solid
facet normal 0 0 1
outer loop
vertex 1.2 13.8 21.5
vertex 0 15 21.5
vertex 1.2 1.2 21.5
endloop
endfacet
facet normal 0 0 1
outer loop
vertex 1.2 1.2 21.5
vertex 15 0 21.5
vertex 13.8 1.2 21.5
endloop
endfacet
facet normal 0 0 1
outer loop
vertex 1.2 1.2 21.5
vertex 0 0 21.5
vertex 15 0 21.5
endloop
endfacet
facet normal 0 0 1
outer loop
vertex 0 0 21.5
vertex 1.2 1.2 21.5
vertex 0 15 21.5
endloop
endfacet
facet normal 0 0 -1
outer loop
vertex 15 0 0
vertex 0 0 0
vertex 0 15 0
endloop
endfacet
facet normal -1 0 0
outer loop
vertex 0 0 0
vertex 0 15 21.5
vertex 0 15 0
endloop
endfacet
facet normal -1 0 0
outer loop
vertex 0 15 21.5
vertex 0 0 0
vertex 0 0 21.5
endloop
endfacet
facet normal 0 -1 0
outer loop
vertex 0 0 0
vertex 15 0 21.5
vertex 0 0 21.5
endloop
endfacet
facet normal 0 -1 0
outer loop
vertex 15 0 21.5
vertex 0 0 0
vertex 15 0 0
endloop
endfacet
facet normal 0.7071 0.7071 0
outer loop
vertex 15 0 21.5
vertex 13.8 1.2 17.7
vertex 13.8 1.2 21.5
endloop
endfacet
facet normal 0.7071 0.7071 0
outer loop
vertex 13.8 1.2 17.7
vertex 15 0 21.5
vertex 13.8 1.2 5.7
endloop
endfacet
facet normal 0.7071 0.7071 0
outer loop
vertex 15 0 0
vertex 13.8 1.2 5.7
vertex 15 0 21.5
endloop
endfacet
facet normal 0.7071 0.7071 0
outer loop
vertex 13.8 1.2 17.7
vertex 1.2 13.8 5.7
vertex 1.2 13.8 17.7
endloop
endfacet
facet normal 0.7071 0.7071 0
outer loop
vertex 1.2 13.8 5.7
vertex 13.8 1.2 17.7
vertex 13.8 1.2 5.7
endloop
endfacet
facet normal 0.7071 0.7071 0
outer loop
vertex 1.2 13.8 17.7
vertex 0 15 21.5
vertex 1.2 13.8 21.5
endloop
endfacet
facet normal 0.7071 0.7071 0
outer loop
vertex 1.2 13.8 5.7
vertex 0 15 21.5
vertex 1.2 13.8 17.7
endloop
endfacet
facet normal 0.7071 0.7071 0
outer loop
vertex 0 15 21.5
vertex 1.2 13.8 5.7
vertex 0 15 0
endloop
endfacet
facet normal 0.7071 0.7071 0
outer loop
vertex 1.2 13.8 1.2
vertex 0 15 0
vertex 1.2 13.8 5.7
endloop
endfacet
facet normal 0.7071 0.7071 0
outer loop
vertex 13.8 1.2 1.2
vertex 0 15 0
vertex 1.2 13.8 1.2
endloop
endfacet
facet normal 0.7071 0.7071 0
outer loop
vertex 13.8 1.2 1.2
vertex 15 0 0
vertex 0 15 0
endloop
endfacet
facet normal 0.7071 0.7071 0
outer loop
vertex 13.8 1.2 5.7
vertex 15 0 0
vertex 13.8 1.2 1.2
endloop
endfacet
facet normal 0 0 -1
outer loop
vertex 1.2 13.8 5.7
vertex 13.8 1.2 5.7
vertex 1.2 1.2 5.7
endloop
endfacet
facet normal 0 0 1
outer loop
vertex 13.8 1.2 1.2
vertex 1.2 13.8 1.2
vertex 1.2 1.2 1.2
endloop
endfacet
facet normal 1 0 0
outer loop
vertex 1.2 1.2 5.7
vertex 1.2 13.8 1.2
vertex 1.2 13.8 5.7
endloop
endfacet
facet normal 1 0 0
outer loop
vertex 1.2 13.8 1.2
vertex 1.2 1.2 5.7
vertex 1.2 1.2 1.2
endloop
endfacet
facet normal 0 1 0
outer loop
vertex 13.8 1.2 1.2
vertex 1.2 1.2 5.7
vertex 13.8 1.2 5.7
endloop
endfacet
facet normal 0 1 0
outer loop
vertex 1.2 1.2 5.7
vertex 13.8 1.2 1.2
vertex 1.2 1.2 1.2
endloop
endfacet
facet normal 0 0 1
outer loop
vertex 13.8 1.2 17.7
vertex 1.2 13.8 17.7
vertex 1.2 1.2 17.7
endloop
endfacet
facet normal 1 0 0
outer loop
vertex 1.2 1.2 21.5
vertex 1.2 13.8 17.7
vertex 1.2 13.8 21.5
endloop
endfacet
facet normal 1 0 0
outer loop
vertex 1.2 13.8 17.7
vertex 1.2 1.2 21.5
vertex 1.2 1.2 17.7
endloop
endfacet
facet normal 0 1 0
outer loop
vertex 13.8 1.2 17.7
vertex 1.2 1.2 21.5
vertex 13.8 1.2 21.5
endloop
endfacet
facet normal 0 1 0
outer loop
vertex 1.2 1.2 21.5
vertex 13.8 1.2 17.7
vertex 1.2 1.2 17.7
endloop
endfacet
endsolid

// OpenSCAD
DELTA=0.01;

WIDTH = 15;
LED=12;
GLASS_THICK=4.5;
ACRYLIC_THICK=2.6;

BOTTOM = 1.2;
TOP = 1.2;
WALL = 1.2;

HEIGHT = BOTTOM + GLASS_THICK + LED + ACRYLIC_THICK + TOP;

module mirror()
{
    cube([304,304,GLASS_THICK]);
}

module acrylic()
{
    cube([304,304,ACRYLIC_THICK]);
}

module corner()
{
    difference()
    {
        cube([WIDTH, WIDTH, HEIGHT]);
        translate([WIDTH, 0, -DELTA]) rotate([0,0,45]) cube([WIDTH*sqrt(2), WIDTH*sqrt(2), HEIGHT + DELTA*2]);
    }
}

difference()
{
    corner();
    translate([WALL, WALL, BOTTOM]) mirror();
    translate([WALL, WALL, BOTTOM + GLASS_THICK + LED]) scale([1,1,2]) acrylic();
}
